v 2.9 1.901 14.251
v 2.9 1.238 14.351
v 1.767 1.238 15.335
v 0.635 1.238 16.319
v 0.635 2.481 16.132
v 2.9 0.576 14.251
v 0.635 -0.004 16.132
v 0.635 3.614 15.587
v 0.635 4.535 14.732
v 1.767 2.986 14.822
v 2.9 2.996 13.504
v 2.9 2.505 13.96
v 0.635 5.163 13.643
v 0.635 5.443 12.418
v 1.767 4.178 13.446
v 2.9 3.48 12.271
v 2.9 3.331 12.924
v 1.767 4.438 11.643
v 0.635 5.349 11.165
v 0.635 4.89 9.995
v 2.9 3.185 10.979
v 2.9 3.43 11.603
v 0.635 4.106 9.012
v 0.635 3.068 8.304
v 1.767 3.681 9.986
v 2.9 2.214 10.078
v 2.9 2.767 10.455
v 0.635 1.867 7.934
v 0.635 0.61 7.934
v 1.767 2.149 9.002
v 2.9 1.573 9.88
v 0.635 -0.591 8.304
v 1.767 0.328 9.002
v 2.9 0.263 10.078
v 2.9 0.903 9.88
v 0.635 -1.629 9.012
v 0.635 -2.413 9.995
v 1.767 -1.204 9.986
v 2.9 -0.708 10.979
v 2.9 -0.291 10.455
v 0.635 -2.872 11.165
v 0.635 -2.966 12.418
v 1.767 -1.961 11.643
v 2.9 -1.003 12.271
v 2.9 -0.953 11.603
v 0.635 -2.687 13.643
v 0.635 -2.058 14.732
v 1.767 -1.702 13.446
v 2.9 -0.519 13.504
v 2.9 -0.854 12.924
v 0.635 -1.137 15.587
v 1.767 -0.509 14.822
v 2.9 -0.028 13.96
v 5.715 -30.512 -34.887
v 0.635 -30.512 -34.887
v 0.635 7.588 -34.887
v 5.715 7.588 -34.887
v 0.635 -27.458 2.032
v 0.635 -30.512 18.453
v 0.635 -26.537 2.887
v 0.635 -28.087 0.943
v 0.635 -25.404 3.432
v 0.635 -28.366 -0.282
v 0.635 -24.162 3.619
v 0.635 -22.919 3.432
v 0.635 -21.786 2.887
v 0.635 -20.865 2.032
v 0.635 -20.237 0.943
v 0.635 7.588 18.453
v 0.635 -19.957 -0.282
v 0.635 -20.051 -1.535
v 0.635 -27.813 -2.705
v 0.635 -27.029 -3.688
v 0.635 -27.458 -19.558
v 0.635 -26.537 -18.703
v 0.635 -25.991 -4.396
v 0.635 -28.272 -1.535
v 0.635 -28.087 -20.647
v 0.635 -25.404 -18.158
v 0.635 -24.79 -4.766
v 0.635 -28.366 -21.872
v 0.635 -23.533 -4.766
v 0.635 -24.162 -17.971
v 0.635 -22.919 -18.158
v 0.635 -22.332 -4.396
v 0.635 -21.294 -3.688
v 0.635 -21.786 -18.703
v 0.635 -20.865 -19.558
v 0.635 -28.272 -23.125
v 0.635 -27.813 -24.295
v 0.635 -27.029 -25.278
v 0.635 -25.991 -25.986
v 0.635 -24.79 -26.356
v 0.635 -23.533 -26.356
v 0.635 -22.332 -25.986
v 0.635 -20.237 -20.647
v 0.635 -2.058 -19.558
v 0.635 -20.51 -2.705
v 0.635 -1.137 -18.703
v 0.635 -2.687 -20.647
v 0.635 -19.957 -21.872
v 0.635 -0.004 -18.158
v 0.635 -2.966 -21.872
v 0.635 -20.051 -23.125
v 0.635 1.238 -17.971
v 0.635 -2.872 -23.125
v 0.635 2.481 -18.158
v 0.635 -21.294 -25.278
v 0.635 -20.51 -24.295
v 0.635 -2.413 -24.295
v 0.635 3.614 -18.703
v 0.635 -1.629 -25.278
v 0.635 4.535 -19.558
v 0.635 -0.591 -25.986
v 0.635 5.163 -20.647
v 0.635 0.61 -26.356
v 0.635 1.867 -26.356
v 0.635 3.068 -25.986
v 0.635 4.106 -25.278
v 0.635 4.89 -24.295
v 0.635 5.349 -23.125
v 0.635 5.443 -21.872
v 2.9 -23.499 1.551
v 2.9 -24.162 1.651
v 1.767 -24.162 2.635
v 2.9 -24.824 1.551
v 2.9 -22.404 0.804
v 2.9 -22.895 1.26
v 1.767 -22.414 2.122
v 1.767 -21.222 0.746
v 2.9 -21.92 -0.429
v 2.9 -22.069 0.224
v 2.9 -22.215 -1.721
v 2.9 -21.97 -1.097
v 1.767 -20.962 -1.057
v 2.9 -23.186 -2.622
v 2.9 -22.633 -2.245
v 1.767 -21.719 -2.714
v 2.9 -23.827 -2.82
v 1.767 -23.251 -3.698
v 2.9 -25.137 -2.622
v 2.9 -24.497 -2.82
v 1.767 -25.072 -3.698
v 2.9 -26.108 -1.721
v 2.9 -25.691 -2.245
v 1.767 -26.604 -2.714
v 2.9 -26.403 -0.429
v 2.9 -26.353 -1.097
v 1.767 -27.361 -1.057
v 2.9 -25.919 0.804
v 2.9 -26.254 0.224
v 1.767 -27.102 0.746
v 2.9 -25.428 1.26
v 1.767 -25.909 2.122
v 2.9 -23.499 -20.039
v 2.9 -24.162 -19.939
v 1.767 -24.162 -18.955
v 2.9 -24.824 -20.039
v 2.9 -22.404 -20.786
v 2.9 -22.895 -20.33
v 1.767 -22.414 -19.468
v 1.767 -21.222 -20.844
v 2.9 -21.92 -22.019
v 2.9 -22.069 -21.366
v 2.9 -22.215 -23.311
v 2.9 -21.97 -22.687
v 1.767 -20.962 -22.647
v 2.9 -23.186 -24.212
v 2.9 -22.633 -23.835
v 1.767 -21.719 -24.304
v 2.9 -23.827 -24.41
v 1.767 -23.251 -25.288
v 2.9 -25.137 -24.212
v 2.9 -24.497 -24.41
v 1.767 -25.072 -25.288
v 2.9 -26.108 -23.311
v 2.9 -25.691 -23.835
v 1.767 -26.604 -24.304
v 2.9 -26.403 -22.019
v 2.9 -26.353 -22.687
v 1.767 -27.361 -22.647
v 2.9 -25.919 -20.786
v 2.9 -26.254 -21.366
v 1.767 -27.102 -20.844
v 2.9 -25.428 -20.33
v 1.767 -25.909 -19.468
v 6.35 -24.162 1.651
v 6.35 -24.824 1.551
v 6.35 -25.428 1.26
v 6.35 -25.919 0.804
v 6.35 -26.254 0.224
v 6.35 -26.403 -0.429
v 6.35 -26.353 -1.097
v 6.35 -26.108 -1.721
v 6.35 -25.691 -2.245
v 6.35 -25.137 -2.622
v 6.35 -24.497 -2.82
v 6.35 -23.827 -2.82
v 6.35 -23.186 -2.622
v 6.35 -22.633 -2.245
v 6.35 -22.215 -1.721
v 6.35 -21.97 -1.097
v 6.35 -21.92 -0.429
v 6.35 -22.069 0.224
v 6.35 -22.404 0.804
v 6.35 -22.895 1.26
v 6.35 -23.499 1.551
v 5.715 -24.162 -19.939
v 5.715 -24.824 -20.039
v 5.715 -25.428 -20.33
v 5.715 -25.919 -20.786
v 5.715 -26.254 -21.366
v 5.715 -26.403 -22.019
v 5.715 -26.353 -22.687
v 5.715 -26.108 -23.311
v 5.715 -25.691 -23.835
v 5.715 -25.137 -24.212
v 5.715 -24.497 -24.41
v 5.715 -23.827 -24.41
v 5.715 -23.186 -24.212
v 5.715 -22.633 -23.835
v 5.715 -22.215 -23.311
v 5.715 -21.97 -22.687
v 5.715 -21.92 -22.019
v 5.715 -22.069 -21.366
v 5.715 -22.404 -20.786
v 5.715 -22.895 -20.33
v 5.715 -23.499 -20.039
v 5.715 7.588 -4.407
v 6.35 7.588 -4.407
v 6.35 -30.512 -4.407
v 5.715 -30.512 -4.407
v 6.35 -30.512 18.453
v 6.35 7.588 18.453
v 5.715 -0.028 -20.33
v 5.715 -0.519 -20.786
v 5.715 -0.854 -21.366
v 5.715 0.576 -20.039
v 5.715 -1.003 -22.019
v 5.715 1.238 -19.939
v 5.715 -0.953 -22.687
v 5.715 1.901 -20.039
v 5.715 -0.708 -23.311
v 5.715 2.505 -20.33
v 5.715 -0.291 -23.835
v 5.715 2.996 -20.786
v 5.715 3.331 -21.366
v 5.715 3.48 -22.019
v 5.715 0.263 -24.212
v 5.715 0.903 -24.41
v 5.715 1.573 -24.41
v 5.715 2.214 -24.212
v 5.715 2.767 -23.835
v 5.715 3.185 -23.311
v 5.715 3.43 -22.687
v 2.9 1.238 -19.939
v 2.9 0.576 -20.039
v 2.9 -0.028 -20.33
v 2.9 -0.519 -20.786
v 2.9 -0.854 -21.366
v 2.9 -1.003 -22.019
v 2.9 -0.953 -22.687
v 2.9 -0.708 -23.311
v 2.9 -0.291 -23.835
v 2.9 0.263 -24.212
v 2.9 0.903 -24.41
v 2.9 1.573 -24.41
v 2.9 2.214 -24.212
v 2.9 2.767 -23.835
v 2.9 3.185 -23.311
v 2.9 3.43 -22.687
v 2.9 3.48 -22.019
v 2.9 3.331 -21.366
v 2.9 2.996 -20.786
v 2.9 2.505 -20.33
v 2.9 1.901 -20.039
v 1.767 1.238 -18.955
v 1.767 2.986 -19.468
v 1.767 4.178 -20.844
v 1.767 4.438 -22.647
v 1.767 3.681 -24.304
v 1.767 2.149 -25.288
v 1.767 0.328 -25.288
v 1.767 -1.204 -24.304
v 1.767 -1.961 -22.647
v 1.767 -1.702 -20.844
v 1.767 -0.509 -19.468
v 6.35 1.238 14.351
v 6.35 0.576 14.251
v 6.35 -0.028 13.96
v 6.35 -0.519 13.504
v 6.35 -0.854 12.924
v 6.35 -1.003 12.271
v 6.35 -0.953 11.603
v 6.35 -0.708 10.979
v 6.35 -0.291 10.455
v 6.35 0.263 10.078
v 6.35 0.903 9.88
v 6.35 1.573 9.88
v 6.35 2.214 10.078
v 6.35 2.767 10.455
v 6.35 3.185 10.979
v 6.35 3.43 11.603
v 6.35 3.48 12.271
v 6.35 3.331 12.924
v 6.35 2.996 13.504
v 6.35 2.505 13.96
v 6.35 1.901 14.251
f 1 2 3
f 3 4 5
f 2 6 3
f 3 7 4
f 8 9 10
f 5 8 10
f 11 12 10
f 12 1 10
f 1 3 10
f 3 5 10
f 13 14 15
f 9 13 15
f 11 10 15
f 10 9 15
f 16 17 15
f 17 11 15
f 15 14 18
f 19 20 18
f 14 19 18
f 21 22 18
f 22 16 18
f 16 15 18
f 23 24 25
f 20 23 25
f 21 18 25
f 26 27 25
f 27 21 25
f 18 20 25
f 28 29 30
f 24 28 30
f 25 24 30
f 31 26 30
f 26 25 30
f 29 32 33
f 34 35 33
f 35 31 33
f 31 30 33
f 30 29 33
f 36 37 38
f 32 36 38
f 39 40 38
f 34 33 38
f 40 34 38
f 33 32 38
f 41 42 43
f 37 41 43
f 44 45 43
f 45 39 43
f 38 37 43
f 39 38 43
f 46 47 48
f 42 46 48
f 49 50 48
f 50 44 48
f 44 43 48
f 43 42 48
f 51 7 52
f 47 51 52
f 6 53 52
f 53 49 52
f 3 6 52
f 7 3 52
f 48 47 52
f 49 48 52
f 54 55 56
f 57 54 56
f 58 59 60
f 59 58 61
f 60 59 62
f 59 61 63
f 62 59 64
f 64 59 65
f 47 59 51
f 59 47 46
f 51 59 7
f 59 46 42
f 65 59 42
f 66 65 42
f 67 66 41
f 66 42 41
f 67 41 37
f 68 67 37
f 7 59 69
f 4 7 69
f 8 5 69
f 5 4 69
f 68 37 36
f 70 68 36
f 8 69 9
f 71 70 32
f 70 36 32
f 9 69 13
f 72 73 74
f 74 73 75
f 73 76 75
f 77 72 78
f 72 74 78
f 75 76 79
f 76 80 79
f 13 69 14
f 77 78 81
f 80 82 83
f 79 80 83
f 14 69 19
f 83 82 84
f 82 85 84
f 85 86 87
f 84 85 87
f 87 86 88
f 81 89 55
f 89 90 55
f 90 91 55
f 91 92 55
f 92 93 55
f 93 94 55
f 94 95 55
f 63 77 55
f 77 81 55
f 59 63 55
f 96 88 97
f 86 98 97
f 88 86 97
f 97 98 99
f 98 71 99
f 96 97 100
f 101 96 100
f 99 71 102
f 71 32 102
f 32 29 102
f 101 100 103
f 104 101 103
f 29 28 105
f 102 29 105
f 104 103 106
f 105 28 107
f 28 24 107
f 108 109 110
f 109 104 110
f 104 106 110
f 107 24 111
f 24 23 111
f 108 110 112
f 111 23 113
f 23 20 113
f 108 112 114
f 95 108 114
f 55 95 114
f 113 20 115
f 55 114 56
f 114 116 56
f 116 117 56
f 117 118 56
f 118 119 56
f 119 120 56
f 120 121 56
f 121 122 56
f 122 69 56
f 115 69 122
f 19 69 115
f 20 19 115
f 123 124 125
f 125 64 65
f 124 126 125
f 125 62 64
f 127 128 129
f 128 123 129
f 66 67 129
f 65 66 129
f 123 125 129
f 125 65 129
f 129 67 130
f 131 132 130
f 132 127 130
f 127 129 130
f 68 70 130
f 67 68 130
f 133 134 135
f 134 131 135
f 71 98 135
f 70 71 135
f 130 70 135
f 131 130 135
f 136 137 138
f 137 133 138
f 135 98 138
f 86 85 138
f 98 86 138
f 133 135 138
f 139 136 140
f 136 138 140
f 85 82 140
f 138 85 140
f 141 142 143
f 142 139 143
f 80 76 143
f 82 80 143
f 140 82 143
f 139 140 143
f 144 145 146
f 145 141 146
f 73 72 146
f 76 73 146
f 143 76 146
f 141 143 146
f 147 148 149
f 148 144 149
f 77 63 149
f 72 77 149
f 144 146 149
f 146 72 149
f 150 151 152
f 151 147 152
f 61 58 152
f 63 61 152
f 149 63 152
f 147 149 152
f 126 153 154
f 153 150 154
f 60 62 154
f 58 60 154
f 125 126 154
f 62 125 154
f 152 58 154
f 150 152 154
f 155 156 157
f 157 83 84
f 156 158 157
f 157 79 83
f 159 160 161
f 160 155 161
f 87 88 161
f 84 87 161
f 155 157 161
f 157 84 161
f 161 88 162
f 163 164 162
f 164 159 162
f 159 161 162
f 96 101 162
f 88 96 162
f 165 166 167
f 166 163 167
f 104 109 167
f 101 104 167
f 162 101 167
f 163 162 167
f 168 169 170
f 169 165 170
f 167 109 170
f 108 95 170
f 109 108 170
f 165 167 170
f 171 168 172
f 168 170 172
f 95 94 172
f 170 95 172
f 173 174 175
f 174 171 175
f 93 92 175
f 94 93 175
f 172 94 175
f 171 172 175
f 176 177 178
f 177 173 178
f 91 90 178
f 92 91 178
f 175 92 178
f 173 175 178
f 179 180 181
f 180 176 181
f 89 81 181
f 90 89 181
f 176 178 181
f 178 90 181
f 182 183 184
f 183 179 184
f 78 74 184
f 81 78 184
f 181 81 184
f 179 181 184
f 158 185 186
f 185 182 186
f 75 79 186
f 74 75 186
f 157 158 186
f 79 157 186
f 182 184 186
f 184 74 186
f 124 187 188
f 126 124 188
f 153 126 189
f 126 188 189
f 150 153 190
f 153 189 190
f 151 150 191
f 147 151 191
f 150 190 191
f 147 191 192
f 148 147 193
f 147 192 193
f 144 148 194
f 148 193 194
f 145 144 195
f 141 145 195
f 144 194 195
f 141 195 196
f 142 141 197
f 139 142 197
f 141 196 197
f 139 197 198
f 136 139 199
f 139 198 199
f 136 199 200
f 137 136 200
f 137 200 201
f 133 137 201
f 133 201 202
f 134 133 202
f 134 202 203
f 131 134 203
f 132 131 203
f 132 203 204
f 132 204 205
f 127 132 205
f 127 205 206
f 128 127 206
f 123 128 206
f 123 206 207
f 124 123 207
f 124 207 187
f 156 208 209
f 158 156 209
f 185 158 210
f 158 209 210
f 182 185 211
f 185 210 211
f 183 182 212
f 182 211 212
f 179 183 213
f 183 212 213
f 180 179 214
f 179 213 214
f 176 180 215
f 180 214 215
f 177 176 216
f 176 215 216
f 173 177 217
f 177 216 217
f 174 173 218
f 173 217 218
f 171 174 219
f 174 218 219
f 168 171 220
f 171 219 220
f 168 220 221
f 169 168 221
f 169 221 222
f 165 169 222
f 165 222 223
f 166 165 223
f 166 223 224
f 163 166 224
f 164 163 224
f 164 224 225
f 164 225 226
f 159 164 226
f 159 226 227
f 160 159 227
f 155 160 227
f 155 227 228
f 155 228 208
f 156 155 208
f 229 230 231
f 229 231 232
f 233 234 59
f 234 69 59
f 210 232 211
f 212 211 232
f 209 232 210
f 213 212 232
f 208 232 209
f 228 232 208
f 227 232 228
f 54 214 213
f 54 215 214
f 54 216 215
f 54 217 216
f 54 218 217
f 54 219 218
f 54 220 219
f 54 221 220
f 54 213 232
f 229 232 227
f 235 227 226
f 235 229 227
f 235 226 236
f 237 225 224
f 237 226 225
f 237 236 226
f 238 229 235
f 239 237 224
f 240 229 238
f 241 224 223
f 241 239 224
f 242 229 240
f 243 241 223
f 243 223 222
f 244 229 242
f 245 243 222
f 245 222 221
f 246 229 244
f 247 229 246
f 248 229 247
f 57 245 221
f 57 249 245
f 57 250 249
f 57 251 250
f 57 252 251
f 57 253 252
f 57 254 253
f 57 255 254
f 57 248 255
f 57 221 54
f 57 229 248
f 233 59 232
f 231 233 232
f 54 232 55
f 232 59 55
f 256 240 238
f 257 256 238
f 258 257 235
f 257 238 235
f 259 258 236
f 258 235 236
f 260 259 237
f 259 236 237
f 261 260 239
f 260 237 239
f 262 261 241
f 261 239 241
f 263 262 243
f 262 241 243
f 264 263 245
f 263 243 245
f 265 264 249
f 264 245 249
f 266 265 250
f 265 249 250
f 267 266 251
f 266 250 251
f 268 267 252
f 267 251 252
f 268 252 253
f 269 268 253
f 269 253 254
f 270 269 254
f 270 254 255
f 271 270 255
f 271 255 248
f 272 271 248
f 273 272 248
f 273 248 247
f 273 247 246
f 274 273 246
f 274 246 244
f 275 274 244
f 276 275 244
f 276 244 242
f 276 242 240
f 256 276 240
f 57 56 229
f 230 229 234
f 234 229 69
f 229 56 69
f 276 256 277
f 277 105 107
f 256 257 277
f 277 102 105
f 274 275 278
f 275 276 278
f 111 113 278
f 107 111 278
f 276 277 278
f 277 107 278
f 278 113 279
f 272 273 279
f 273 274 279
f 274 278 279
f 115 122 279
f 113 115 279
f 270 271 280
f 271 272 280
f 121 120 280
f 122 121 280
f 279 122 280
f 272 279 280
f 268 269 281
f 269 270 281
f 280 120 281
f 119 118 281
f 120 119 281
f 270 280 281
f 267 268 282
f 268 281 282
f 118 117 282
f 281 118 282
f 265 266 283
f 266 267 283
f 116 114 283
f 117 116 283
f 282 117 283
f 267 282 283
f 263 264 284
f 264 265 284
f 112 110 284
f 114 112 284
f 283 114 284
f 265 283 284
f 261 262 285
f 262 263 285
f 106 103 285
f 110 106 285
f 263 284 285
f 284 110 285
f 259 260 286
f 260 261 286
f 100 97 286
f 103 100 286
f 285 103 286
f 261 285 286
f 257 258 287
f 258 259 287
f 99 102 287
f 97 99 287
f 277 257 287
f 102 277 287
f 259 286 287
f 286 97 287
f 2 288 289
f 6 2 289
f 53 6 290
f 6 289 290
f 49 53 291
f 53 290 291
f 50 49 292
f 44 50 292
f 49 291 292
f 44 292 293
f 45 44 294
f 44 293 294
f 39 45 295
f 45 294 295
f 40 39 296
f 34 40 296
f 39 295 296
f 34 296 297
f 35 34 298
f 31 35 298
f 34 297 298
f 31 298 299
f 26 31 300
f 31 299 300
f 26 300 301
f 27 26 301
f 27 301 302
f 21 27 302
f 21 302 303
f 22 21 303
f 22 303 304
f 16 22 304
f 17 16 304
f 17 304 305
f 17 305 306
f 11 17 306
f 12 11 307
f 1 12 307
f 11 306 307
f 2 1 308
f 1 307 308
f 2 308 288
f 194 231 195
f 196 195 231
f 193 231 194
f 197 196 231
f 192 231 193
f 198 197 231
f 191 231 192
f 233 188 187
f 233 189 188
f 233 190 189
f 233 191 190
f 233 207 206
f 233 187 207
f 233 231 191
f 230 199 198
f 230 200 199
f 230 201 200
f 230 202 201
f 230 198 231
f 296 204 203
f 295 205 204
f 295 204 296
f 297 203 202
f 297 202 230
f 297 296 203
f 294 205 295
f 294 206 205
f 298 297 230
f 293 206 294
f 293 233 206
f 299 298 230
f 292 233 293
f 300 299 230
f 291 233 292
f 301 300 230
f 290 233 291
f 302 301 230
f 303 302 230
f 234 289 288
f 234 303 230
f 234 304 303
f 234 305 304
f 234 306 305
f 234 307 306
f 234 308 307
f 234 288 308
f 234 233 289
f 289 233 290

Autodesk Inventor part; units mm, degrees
ref_plane "YZ Plane" through (0, 0, 0) normal (1, 0, 0) x (0, 1, 0)
ref_plane "XZ Plane" through (0, 0, 0) normal (0, 1, 0) x (-1, 0, 0)
ref_plane "XY Plane" through (0, 0, 0) normal (0, 0, 1) x (1, 0, 0)
sketch "Sketch1" plane through (0, 0, 0) normal (1, 0, 0) x (0, 1, 0)
  line L0 (7.5884, 18.4529) -> (-30.5116, 18.4529)
  line L1 (-30.5116, 18.4529) -> (-30.5116, -34.8871)
  line L2 (-30.5116, -34.8871) -> (7.5884, -34.8871)
  line L3 (7.5884, -34.8871) -> (7.5884, 18.4529)
  point P0 (0, 0)
  dimension "d0" = 53.34
  dimension "d1" = 38.1
extrude "Extrusion1" add sketch "Sketch1" along normal blind 6.35
sketch "Sketch3" plane through (0, 7.5884, 18.4529) normal (0, 1, 0) x (1, 0, 0)
  line L0 (0, 22.86) -> (0.635, 22.86)
  line L1 (0.635, 22.86) -> (0.635, 53.34)
  line L2 (0.635, 53.34) -> (0, 53.34)
  line L3 (0, 53.34) -> (0, 22.86)
  line L4 (5.715, 53.34) -> (6.35, 53.34)
  line L5 (6.35, 53.34) -> (6.35, 22.86)
  line L6 (6.35, 22.86) -> (5.715, 22.86)
  line L7 (5.715, 22.86) -> (5.715, 53.34)
  line L8 (6.35, 53.34) -> (6.35, 0) projected
  line L9 (0, 53.34) -> (0, 0) projected
  line L10 (0, 53.34) -> (6.35, 53.34) projected
  point P0 (0, 18.4529)
  dimension "d19" = 30.48
  dimension "d20" = 30.48
  dimension "d21" = 0
  dimension "d22" = 0
  dimension "d23" = 0.635
  dimension "d24" = 0.635
  dimension "d25" = 0
extrude "Extrusion2" cut sketch "Sketch3" against normal blind 50.8
sketch "Sketch4" plane through (0, 7.5884, 18.4529) normal (0, 1, 0) x (1, 0, 0)
  line L0 (0.635, 34.7601) -> (-3.8704, 34.7601)
  line L1 (-3.8704, 34.7601) -> (-3.8704, -3.0853)
  line L2 (-3.8704, -3.0853) -> (0.635, -3.0853)
  line L3 (0.635, -3.0853) -> (0.635, 34.7601)
  line L4 (0.635, 53.34) -> (0.635, 22.86) projected
  point P0 (0, 18.4529)
  point P1 (0.635, 53.34)
  dimension "d28" = 0
extrude "Extrusion3" cut sketch "Sketch4" against normal blind 50.8
sketch "Sketch5" plane through (0.635, 7.5884, -34.8871) normal (-1, 0, 0) x (0, 0, 1)
  line L0 (53.34, 0) -> (53.34, -38.1) projected
  line L1 (0, 0) -> (53.34, 0) projected
  line L2 (0, -38.1) -> (0, 0) projected
  point P0 (34.8871, -7.5884)
  point P1 (46.99, -6.35)
  point P2 (34.29, -31.75)
  point P3 (53.34, -38.1)
  point P4 (12.7, -31.75)
  point P5 (12.7, -6.35)
  point P6 (52.07, -25.4)
  point P7 (5.08, 0)
  dimension "d31" = 6.35
  dimension "d32" = 6.35
  dimension "d33" = 31.75
  dimension "d34" = 19.05
  dimension "d35" = 31.75
  dimension "d36" = 12.7
  dimension "d37" = 12.7
  dimension "d38" = 6.35
hole "Hole2" at (0.635, 1.2384, 12.1029) at (0.635, -24.1616, -0.5971) at (0.635, -24.1616, -22.1871) at (0.635, 1.2384, -22.1871) direction (1, 0, 0) diameter 4.4958 end through all countersink diameter 8.4328 countersink angle 82 clearance for "Flat Head Machine Screw (82)" size "#8" standard "Ansi Unified Screw Threads"
properties part number "GripperSidePlate"
